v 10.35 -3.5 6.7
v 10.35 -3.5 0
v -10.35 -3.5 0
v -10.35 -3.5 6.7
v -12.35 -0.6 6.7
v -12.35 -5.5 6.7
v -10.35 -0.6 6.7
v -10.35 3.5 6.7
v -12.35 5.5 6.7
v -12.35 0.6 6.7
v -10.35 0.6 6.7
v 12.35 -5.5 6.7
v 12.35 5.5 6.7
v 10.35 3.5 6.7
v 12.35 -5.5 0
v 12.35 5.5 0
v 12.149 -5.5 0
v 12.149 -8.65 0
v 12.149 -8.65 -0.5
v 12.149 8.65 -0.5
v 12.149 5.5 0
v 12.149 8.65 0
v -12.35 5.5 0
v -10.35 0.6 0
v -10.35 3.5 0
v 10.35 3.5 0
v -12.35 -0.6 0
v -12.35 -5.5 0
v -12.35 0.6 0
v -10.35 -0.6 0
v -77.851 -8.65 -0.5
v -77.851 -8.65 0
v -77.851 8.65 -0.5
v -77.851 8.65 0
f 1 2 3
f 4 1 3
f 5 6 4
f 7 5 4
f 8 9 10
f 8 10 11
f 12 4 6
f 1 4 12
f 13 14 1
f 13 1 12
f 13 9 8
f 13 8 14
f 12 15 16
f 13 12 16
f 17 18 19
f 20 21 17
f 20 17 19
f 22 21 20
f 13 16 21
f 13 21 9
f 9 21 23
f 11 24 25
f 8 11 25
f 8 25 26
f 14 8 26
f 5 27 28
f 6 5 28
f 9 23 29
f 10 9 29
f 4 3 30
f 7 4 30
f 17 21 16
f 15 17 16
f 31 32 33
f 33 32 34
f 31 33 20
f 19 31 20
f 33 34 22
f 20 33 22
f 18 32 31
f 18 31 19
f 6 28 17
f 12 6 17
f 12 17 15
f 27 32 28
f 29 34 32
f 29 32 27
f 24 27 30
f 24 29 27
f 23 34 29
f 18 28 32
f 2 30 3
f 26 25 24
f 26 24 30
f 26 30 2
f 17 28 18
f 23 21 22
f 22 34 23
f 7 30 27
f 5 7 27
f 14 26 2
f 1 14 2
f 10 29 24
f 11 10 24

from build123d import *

# Parameters (mm, degrees)
PAD_DEPTH    = 6.7
SKETCH001_W  = 90
SKETCH001_H  = 17.3
PAD001_DEPTH = 0.5


with BuildPart() as part:
    # Sketch (on Sketch) → Pad (new body)
    with BuildSketch(Plane.XY):
        Polygon((-10.35, 3.5), (10.35, 3.5), (10.35, -3.5), (-10.35, -3.5), (-10.35, -0.6), (-12.35, -0.6), (-12.35, -5.5), (12.35, -5.5), (12.35, 5.5), (-12.35, 5.5), (-12.35, 0.6), (-10.35, 0.6), align=None)
    extrude(amount=PAD_DEPTH)

    # Sketch001 → Pad001 (join)
    with BuildSketch(Plane.XY):
        with Locations((-32.851308, 0)):
            Rectangle(SKETCH001_W, SKETCH001_H)
    extrude(amount=-PAD001_DEPTH)


solid = part.part
